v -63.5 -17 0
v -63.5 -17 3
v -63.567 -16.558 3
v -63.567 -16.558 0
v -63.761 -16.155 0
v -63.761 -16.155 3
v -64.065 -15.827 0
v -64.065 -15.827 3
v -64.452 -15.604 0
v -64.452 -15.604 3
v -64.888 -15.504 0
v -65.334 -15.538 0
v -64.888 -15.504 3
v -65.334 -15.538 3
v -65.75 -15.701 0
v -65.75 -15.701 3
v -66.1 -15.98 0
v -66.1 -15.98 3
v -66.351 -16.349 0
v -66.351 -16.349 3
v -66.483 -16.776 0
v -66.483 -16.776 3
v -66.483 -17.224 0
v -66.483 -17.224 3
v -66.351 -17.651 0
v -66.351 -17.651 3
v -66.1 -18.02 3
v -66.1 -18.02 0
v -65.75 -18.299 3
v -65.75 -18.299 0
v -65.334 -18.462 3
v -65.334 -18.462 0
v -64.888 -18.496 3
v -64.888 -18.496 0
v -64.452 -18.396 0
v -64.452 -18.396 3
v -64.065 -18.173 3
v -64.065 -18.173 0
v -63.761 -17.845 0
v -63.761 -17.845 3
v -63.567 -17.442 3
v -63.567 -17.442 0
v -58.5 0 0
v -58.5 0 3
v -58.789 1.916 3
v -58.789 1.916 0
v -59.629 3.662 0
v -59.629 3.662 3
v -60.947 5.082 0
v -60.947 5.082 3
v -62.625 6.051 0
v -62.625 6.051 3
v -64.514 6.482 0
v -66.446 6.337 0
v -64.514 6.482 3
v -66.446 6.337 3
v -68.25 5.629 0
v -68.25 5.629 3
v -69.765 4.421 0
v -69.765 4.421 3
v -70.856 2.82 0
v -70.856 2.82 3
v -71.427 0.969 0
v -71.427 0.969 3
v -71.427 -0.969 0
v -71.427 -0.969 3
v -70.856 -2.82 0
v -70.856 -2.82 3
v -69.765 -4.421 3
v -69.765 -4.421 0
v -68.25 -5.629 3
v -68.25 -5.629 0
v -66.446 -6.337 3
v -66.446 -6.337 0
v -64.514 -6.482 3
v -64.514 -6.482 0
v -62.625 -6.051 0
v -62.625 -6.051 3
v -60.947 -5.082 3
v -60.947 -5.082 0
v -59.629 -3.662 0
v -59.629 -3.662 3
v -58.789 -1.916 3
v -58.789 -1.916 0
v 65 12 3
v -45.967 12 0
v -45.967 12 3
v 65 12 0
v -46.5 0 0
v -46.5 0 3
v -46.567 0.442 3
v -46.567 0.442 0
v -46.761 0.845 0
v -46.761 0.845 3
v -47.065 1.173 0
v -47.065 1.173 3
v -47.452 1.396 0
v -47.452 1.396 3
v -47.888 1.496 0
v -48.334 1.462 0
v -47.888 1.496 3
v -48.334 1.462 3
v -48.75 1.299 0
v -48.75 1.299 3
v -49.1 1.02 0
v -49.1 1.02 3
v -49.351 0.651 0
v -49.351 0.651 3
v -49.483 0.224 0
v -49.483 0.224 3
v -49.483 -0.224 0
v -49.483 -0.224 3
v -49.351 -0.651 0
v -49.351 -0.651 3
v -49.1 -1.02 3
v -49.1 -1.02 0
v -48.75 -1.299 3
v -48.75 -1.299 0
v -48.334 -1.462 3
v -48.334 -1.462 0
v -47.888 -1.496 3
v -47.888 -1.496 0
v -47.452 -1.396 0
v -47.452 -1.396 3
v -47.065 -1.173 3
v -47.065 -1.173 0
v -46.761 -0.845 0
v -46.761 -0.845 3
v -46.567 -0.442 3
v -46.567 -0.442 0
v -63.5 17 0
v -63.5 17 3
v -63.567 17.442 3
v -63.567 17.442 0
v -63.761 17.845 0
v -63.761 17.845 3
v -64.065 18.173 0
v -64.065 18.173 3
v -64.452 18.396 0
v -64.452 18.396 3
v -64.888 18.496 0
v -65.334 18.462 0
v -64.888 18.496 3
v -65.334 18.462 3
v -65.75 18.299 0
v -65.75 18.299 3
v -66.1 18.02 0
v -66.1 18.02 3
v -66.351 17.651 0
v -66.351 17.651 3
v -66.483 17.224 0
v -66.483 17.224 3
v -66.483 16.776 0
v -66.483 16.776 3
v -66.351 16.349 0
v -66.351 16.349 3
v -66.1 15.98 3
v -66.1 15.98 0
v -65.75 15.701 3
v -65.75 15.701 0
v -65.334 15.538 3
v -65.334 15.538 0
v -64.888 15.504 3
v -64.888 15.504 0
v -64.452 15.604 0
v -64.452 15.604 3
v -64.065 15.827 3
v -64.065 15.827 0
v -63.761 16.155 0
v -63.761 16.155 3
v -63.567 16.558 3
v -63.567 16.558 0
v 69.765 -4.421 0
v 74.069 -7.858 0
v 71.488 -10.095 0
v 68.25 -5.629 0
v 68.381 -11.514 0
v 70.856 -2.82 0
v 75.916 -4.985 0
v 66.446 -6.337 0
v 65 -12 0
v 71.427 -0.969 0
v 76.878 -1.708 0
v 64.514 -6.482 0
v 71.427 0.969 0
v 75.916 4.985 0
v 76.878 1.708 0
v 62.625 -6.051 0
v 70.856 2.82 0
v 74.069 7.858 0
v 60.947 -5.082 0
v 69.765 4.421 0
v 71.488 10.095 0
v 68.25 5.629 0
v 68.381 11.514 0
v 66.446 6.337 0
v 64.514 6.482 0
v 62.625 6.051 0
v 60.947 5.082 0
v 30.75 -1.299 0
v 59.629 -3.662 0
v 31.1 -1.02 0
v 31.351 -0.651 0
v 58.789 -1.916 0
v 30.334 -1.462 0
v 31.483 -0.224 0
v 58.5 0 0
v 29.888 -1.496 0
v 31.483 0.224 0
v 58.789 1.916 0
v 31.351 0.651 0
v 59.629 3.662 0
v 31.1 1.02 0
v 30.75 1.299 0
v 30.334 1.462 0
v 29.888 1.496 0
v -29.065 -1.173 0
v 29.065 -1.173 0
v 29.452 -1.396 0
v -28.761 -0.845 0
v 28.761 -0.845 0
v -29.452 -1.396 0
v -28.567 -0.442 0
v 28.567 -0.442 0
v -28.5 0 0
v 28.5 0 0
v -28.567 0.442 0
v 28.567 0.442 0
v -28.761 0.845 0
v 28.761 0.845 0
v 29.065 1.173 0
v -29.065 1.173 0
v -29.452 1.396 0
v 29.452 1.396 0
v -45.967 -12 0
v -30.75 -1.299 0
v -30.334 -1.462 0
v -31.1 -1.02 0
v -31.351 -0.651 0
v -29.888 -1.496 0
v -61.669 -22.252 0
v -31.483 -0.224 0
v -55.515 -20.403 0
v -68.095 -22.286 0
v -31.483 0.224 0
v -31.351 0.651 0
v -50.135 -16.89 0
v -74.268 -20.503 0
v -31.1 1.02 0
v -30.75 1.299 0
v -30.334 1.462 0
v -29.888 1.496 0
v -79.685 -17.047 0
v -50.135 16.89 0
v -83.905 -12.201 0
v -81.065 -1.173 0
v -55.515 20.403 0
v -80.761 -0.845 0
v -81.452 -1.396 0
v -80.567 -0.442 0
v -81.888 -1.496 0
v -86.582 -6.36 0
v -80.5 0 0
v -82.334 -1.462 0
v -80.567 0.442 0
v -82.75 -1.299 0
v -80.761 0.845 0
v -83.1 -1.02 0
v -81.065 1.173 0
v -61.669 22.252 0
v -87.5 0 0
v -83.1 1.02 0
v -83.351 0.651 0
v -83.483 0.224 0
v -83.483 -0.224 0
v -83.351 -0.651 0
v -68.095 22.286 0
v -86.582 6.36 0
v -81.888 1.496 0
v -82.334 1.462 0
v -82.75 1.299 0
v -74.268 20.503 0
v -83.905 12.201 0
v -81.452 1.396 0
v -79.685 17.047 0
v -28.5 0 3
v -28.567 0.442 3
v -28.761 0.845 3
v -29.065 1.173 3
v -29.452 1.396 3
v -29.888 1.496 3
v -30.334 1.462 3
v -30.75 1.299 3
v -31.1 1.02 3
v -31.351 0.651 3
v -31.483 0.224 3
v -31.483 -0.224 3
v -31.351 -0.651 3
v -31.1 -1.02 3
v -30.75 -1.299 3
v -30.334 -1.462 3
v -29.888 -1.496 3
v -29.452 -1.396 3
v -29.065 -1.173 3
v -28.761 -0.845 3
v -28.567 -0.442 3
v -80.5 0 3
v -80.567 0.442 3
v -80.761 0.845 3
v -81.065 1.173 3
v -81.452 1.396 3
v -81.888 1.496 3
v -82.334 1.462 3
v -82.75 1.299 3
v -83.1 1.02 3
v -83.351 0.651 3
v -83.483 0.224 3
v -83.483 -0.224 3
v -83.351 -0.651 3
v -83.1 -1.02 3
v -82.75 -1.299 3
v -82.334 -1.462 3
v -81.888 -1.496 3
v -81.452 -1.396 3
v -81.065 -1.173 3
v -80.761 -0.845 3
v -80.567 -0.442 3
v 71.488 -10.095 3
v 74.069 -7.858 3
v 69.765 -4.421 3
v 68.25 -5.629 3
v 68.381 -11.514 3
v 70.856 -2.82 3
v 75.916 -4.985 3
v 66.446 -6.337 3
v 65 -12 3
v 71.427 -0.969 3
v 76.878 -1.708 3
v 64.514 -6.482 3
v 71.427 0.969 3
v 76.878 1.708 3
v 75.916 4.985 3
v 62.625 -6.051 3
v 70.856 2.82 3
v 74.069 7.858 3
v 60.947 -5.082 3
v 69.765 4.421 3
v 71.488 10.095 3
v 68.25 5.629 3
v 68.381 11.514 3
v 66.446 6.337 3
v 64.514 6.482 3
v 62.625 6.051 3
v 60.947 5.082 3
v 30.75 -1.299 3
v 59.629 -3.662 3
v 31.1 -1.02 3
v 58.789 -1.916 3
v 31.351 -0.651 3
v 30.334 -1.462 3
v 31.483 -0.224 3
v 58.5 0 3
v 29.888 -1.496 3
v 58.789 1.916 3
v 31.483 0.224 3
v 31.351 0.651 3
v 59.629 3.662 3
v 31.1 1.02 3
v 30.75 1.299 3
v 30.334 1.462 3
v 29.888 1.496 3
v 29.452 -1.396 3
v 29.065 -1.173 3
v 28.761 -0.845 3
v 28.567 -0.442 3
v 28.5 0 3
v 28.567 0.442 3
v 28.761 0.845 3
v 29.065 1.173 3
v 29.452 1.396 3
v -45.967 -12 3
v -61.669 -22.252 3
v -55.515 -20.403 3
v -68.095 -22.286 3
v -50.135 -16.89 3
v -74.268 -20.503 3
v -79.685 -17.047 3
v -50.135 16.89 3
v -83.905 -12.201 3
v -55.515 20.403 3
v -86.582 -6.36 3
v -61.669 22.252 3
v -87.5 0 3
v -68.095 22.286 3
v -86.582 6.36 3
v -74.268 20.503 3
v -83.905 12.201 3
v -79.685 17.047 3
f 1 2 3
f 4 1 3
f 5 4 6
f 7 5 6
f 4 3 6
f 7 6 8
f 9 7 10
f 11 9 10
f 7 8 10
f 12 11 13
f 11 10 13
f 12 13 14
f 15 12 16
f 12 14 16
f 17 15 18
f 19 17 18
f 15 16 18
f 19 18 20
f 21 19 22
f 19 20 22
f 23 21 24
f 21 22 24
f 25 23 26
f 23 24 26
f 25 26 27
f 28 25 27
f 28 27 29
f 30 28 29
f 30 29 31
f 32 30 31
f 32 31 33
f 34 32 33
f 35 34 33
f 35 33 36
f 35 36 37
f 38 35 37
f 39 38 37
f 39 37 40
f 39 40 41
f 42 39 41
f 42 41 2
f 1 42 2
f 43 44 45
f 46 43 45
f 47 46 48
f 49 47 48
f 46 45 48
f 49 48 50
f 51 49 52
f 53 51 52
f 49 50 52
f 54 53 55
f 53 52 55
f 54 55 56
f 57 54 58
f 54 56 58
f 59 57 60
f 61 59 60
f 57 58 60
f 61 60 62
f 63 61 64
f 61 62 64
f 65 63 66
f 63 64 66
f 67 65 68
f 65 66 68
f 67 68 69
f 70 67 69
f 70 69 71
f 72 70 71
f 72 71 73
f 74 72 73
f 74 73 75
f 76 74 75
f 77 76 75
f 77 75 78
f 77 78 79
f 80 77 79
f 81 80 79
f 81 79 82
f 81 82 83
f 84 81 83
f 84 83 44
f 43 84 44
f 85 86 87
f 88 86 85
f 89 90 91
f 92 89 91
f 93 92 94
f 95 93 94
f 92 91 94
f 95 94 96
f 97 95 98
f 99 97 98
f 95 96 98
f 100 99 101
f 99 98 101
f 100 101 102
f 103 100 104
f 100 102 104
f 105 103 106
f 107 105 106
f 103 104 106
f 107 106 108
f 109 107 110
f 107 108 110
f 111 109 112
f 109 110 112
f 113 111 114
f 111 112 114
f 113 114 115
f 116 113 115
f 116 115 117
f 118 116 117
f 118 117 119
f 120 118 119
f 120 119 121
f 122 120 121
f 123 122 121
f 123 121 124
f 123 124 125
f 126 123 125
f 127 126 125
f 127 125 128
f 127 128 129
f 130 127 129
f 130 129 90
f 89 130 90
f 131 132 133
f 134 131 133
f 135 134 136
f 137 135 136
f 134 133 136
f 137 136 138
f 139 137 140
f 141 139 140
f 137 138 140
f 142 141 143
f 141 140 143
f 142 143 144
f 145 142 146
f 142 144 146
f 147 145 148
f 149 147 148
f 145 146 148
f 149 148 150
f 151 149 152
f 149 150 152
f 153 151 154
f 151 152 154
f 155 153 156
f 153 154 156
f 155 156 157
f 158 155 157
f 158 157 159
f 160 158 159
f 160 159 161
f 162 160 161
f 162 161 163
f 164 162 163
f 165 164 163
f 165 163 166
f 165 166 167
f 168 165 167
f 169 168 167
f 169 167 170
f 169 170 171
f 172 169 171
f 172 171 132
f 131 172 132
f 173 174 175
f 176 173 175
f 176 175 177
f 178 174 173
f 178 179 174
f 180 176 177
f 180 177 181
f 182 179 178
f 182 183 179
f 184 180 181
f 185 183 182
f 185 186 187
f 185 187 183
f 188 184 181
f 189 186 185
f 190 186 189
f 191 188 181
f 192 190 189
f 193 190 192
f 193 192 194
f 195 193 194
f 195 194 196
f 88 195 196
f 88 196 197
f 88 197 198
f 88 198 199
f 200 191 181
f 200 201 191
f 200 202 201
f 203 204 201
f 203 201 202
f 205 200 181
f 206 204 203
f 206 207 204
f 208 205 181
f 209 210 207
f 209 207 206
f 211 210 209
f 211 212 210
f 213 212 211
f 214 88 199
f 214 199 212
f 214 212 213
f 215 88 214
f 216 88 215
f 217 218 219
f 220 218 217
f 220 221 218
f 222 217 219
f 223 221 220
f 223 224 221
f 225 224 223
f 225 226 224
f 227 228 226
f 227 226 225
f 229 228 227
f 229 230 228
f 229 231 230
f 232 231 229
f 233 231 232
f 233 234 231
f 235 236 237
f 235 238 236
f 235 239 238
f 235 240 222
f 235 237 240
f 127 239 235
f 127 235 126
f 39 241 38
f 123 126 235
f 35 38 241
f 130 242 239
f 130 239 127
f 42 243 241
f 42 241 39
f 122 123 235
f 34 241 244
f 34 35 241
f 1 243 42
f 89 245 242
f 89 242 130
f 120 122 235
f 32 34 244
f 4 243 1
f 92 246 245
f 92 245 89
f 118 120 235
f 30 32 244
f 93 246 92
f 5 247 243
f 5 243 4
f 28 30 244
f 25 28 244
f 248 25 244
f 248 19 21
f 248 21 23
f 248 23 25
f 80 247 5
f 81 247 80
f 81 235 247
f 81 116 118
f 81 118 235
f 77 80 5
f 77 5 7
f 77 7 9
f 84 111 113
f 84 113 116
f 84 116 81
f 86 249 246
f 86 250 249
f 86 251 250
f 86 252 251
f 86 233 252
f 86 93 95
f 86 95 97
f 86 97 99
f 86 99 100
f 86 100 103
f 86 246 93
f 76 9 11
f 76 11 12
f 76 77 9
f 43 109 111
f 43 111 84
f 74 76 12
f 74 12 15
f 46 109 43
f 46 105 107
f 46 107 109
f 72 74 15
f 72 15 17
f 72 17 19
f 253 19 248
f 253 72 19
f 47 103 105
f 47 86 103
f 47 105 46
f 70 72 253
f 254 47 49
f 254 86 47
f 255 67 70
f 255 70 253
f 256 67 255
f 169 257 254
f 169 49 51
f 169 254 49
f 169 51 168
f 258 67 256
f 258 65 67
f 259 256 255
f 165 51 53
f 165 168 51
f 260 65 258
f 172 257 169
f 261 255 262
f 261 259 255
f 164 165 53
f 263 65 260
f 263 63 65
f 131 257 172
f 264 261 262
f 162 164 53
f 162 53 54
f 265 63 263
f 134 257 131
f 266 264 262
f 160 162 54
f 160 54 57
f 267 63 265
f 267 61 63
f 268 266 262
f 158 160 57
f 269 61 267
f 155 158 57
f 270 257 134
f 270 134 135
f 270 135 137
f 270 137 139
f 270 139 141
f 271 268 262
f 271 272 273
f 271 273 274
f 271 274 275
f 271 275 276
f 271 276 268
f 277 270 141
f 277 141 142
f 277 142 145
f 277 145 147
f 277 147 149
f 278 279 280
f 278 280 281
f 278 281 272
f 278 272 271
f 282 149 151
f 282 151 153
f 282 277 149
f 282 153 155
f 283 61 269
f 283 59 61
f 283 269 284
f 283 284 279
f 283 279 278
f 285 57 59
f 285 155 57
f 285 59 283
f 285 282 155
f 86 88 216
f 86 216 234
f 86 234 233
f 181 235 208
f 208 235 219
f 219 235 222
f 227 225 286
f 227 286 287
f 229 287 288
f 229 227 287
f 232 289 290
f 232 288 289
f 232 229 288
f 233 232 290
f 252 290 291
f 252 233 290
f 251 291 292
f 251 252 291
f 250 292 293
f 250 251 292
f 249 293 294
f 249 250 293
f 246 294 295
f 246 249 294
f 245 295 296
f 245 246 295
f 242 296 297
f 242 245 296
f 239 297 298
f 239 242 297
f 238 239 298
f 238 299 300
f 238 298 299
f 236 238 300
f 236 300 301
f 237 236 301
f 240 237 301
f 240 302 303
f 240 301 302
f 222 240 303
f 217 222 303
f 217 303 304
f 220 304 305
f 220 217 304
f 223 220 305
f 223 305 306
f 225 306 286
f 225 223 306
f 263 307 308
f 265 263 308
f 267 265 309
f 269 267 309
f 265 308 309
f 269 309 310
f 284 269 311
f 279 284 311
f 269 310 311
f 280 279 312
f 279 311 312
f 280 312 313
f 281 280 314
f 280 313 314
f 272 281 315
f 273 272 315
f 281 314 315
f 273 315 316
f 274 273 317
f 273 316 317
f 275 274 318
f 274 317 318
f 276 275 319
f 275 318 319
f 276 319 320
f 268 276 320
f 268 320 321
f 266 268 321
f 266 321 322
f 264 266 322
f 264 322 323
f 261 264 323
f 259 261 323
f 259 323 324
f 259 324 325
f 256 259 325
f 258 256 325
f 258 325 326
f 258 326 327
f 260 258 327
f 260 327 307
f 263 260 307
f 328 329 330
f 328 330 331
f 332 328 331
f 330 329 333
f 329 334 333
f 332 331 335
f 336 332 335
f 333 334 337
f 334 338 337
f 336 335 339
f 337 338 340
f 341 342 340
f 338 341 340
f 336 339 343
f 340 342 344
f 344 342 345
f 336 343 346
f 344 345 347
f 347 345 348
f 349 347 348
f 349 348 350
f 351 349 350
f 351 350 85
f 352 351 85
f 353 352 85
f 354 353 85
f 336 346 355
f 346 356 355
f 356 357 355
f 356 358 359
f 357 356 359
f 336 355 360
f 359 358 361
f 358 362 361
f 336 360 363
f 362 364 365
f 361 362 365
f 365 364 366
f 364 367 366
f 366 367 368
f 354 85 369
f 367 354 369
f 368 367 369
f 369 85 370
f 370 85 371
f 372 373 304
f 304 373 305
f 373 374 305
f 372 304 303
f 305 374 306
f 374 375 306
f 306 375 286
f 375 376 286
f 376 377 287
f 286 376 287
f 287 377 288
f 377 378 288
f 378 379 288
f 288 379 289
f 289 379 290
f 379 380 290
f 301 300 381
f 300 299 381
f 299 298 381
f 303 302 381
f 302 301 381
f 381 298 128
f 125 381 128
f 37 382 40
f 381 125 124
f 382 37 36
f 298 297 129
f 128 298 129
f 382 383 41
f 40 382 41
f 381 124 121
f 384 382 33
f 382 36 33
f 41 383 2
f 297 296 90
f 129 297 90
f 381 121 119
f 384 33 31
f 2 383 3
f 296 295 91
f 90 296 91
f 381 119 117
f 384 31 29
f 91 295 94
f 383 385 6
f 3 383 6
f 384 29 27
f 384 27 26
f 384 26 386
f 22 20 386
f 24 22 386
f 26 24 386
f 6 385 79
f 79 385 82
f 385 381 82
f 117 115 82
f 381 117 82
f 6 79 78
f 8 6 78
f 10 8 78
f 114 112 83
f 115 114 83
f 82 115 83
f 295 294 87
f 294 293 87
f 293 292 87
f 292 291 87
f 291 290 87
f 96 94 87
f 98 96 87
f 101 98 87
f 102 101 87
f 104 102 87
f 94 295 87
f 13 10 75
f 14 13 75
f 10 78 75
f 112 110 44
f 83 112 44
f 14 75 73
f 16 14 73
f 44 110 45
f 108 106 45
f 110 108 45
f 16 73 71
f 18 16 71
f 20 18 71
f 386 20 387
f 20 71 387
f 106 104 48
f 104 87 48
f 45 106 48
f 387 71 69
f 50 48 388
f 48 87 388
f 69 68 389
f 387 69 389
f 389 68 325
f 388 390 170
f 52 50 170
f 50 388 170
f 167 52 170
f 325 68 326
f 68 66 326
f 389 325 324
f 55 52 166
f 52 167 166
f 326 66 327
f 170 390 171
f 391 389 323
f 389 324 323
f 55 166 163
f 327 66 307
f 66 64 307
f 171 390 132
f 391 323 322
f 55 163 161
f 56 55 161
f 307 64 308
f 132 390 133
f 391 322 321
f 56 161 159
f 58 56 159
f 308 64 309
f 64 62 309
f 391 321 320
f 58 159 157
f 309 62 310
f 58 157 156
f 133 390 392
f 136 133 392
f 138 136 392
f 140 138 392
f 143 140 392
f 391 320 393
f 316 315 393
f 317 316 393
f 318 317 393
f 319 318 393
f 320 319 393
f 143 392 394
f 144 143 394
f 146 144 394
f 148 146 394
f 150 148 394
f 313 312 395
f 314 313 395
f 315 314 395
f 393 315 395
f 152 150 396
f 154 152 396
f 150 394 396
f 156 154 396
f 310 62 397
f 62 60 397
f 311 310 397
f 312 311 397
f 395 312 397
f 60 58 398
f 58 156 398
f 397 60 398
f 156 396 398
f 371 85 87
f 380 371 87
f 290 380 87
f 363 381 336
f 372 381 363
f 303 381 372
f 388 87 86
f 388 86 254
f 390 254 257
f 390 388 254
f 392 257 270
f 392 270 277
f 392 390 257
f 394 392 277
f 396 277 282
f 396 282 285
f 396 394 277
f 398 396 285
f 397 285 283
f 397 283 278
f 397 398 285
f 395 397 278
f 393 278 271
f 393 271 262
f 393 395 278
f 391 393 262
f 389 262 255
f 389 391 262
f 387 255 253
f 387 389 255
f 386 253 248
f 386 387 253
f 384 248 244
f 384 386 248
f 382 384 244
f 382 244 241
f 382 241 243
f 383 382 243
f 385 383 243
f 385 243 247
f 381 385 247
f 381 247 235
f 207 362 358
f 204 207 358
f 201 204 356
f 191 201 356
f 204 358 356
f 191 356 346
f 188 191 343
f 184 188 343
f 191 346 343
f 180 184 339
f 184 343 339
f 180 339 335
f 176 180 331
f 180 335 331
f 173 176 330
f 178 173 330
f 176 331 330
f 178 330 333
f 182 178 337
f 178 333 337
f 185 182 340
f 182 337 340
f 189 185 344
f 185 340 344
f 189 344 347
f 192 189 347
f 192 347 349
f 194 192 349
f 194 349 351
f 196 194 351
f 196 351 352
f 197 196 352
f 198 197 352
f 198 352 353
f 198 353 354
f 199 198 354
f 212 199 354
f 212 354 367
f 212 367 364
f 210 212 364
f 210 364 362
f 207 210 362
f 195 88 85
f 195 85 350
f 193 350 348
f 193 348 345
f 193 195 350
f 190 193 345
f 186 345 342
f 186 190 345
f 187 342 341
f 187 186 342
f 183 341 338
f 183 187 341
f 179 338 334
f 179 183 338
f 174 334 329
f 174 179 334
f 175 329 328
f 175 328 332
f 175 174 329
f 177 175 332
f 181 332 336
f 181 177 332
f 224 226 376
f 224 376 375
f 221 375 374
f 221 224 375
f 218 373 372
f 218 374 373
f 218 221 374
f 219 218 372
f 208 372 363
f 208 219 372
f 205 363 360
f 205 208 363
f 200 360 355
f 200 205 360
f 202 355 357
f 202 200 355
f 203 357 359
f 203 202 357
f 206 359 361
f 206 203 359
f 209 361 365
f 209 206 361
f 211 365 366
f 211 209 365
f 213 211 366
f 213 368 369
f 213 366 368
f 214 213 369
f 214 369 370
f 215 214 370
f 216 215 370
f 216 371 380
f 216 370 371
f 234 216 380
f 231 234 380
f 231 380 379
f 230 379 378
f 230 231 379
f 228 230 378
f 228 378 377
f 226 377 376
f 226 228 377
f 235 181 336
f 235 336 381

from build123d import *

# Parameters (mm, degrees)
BOSS_EXTRU_1_DEPTH           = 3
ESQUISSE2_R                  = 6.5
ENL_V_MAT_EXTRU_1_DEPTH      = 78.987178433
ENL_V_MAT_EXTRU_2_DEPTH      = 78.987178433
ENL_V_MAT_EXTRU_2_DEPTH_BACK = 78.987178433
ESQUISSE4_R                  = 1.5
ESQUISSE5_R                  = 22.5
ESQUISSE5_R_2                = 6.5
BOSS_EXTRU_2_DEPTH           = 3
ESQUISSE6_R                  = 1.5
ENL_V_MAT_EXTRU_3_DEPTH      = 91.396349484


with BuildPart() as part:
    # Esquisse1 → Boss.-Extru.1 (new body)
    with BuildSketch(Plane.XY):
        with BuildLine():
            Line((-65, 12), (65, 12))
            ThreePointArc((65, 12), (77, 0), (65, -12))
            Line((65, -12), (-65, -12))
            ThreePointArc((-65, -12), (-77, 0), (-65, 12))
        make_face()
    extrude(amount=BOSS_EXTRU_1_DEPTH)

    # Esquisse2 → Enlèv. mat.-Extru.1 (cut, through all)
    with BuildSketch(Plane.XY.offset(3)):
        with Locations((-65, 0)):
            Circle(ESQUISSE2_R)
        with Locations(Location((65, 0, 0), (0, 0, 180))):
            Circle(ESQUISSE2_R)
    extrude(amount=-ENL_V_MAT_EXTRU_1_DEPTH, mode=Mode.SUBTRACT)

    # Esquisse4 → Enlèv. mat.-Extru.2 (cut, two sides: drawn at the far end of the back side and taken through both)
    with BuildSketch(Plane.XY.offset(3).offset(-ENL_V_MAT_EXTRU_2_DEPTH_BACK)):
        with Locations((-30, 0)):
            Circle(ESQUISSE4_R)
        with Locations(Location((30, 0, 0), (0, 0, 180))):
            Circle(ESQUISSE4_R)
    extrude(amount=ENL_V_MAT_EXTRU_2_DEPTH + ENL_V_MAT_EXTRU_2_DEPTH_BACK, mode=Mode.SUBTRACT)

    # Esquisse5 → Boss.-Extru.2 (add)
    with BuildSketch(Plane.XY.offset(3)):
        with Locations((-65, 0)):
            Circle(ESQUISSE5_R)
        with Locations((-65, 0)):
            Circle(ESQUISSE5_R_2, mode=Mode.SUBTRACT)
    extrude(amount=-BOSS_EXTRU_2_DEPTH)

    # Esquisse6 → Enlèv. mat.-Extru.3 (cut, through all)
    with BuildSketch(Plane.XY.offset(3)):
        with Locations((-65, 17)):
            Circle(ESQUISSE6_R)
        with Locations((-48, 0)):
            Circle(ESQUISSE6_R)
        with Locations((-65, -17)):
            Circle(ESQUISSE6_R)
        with Locations((-82, 0)):
            Circle(ESQUISSE6_R)
    extrude(amount=-ENL_V_MAT_EXTRU_3_DEPTH, mode=Mode.SUBTRACT)


solid = part.part
